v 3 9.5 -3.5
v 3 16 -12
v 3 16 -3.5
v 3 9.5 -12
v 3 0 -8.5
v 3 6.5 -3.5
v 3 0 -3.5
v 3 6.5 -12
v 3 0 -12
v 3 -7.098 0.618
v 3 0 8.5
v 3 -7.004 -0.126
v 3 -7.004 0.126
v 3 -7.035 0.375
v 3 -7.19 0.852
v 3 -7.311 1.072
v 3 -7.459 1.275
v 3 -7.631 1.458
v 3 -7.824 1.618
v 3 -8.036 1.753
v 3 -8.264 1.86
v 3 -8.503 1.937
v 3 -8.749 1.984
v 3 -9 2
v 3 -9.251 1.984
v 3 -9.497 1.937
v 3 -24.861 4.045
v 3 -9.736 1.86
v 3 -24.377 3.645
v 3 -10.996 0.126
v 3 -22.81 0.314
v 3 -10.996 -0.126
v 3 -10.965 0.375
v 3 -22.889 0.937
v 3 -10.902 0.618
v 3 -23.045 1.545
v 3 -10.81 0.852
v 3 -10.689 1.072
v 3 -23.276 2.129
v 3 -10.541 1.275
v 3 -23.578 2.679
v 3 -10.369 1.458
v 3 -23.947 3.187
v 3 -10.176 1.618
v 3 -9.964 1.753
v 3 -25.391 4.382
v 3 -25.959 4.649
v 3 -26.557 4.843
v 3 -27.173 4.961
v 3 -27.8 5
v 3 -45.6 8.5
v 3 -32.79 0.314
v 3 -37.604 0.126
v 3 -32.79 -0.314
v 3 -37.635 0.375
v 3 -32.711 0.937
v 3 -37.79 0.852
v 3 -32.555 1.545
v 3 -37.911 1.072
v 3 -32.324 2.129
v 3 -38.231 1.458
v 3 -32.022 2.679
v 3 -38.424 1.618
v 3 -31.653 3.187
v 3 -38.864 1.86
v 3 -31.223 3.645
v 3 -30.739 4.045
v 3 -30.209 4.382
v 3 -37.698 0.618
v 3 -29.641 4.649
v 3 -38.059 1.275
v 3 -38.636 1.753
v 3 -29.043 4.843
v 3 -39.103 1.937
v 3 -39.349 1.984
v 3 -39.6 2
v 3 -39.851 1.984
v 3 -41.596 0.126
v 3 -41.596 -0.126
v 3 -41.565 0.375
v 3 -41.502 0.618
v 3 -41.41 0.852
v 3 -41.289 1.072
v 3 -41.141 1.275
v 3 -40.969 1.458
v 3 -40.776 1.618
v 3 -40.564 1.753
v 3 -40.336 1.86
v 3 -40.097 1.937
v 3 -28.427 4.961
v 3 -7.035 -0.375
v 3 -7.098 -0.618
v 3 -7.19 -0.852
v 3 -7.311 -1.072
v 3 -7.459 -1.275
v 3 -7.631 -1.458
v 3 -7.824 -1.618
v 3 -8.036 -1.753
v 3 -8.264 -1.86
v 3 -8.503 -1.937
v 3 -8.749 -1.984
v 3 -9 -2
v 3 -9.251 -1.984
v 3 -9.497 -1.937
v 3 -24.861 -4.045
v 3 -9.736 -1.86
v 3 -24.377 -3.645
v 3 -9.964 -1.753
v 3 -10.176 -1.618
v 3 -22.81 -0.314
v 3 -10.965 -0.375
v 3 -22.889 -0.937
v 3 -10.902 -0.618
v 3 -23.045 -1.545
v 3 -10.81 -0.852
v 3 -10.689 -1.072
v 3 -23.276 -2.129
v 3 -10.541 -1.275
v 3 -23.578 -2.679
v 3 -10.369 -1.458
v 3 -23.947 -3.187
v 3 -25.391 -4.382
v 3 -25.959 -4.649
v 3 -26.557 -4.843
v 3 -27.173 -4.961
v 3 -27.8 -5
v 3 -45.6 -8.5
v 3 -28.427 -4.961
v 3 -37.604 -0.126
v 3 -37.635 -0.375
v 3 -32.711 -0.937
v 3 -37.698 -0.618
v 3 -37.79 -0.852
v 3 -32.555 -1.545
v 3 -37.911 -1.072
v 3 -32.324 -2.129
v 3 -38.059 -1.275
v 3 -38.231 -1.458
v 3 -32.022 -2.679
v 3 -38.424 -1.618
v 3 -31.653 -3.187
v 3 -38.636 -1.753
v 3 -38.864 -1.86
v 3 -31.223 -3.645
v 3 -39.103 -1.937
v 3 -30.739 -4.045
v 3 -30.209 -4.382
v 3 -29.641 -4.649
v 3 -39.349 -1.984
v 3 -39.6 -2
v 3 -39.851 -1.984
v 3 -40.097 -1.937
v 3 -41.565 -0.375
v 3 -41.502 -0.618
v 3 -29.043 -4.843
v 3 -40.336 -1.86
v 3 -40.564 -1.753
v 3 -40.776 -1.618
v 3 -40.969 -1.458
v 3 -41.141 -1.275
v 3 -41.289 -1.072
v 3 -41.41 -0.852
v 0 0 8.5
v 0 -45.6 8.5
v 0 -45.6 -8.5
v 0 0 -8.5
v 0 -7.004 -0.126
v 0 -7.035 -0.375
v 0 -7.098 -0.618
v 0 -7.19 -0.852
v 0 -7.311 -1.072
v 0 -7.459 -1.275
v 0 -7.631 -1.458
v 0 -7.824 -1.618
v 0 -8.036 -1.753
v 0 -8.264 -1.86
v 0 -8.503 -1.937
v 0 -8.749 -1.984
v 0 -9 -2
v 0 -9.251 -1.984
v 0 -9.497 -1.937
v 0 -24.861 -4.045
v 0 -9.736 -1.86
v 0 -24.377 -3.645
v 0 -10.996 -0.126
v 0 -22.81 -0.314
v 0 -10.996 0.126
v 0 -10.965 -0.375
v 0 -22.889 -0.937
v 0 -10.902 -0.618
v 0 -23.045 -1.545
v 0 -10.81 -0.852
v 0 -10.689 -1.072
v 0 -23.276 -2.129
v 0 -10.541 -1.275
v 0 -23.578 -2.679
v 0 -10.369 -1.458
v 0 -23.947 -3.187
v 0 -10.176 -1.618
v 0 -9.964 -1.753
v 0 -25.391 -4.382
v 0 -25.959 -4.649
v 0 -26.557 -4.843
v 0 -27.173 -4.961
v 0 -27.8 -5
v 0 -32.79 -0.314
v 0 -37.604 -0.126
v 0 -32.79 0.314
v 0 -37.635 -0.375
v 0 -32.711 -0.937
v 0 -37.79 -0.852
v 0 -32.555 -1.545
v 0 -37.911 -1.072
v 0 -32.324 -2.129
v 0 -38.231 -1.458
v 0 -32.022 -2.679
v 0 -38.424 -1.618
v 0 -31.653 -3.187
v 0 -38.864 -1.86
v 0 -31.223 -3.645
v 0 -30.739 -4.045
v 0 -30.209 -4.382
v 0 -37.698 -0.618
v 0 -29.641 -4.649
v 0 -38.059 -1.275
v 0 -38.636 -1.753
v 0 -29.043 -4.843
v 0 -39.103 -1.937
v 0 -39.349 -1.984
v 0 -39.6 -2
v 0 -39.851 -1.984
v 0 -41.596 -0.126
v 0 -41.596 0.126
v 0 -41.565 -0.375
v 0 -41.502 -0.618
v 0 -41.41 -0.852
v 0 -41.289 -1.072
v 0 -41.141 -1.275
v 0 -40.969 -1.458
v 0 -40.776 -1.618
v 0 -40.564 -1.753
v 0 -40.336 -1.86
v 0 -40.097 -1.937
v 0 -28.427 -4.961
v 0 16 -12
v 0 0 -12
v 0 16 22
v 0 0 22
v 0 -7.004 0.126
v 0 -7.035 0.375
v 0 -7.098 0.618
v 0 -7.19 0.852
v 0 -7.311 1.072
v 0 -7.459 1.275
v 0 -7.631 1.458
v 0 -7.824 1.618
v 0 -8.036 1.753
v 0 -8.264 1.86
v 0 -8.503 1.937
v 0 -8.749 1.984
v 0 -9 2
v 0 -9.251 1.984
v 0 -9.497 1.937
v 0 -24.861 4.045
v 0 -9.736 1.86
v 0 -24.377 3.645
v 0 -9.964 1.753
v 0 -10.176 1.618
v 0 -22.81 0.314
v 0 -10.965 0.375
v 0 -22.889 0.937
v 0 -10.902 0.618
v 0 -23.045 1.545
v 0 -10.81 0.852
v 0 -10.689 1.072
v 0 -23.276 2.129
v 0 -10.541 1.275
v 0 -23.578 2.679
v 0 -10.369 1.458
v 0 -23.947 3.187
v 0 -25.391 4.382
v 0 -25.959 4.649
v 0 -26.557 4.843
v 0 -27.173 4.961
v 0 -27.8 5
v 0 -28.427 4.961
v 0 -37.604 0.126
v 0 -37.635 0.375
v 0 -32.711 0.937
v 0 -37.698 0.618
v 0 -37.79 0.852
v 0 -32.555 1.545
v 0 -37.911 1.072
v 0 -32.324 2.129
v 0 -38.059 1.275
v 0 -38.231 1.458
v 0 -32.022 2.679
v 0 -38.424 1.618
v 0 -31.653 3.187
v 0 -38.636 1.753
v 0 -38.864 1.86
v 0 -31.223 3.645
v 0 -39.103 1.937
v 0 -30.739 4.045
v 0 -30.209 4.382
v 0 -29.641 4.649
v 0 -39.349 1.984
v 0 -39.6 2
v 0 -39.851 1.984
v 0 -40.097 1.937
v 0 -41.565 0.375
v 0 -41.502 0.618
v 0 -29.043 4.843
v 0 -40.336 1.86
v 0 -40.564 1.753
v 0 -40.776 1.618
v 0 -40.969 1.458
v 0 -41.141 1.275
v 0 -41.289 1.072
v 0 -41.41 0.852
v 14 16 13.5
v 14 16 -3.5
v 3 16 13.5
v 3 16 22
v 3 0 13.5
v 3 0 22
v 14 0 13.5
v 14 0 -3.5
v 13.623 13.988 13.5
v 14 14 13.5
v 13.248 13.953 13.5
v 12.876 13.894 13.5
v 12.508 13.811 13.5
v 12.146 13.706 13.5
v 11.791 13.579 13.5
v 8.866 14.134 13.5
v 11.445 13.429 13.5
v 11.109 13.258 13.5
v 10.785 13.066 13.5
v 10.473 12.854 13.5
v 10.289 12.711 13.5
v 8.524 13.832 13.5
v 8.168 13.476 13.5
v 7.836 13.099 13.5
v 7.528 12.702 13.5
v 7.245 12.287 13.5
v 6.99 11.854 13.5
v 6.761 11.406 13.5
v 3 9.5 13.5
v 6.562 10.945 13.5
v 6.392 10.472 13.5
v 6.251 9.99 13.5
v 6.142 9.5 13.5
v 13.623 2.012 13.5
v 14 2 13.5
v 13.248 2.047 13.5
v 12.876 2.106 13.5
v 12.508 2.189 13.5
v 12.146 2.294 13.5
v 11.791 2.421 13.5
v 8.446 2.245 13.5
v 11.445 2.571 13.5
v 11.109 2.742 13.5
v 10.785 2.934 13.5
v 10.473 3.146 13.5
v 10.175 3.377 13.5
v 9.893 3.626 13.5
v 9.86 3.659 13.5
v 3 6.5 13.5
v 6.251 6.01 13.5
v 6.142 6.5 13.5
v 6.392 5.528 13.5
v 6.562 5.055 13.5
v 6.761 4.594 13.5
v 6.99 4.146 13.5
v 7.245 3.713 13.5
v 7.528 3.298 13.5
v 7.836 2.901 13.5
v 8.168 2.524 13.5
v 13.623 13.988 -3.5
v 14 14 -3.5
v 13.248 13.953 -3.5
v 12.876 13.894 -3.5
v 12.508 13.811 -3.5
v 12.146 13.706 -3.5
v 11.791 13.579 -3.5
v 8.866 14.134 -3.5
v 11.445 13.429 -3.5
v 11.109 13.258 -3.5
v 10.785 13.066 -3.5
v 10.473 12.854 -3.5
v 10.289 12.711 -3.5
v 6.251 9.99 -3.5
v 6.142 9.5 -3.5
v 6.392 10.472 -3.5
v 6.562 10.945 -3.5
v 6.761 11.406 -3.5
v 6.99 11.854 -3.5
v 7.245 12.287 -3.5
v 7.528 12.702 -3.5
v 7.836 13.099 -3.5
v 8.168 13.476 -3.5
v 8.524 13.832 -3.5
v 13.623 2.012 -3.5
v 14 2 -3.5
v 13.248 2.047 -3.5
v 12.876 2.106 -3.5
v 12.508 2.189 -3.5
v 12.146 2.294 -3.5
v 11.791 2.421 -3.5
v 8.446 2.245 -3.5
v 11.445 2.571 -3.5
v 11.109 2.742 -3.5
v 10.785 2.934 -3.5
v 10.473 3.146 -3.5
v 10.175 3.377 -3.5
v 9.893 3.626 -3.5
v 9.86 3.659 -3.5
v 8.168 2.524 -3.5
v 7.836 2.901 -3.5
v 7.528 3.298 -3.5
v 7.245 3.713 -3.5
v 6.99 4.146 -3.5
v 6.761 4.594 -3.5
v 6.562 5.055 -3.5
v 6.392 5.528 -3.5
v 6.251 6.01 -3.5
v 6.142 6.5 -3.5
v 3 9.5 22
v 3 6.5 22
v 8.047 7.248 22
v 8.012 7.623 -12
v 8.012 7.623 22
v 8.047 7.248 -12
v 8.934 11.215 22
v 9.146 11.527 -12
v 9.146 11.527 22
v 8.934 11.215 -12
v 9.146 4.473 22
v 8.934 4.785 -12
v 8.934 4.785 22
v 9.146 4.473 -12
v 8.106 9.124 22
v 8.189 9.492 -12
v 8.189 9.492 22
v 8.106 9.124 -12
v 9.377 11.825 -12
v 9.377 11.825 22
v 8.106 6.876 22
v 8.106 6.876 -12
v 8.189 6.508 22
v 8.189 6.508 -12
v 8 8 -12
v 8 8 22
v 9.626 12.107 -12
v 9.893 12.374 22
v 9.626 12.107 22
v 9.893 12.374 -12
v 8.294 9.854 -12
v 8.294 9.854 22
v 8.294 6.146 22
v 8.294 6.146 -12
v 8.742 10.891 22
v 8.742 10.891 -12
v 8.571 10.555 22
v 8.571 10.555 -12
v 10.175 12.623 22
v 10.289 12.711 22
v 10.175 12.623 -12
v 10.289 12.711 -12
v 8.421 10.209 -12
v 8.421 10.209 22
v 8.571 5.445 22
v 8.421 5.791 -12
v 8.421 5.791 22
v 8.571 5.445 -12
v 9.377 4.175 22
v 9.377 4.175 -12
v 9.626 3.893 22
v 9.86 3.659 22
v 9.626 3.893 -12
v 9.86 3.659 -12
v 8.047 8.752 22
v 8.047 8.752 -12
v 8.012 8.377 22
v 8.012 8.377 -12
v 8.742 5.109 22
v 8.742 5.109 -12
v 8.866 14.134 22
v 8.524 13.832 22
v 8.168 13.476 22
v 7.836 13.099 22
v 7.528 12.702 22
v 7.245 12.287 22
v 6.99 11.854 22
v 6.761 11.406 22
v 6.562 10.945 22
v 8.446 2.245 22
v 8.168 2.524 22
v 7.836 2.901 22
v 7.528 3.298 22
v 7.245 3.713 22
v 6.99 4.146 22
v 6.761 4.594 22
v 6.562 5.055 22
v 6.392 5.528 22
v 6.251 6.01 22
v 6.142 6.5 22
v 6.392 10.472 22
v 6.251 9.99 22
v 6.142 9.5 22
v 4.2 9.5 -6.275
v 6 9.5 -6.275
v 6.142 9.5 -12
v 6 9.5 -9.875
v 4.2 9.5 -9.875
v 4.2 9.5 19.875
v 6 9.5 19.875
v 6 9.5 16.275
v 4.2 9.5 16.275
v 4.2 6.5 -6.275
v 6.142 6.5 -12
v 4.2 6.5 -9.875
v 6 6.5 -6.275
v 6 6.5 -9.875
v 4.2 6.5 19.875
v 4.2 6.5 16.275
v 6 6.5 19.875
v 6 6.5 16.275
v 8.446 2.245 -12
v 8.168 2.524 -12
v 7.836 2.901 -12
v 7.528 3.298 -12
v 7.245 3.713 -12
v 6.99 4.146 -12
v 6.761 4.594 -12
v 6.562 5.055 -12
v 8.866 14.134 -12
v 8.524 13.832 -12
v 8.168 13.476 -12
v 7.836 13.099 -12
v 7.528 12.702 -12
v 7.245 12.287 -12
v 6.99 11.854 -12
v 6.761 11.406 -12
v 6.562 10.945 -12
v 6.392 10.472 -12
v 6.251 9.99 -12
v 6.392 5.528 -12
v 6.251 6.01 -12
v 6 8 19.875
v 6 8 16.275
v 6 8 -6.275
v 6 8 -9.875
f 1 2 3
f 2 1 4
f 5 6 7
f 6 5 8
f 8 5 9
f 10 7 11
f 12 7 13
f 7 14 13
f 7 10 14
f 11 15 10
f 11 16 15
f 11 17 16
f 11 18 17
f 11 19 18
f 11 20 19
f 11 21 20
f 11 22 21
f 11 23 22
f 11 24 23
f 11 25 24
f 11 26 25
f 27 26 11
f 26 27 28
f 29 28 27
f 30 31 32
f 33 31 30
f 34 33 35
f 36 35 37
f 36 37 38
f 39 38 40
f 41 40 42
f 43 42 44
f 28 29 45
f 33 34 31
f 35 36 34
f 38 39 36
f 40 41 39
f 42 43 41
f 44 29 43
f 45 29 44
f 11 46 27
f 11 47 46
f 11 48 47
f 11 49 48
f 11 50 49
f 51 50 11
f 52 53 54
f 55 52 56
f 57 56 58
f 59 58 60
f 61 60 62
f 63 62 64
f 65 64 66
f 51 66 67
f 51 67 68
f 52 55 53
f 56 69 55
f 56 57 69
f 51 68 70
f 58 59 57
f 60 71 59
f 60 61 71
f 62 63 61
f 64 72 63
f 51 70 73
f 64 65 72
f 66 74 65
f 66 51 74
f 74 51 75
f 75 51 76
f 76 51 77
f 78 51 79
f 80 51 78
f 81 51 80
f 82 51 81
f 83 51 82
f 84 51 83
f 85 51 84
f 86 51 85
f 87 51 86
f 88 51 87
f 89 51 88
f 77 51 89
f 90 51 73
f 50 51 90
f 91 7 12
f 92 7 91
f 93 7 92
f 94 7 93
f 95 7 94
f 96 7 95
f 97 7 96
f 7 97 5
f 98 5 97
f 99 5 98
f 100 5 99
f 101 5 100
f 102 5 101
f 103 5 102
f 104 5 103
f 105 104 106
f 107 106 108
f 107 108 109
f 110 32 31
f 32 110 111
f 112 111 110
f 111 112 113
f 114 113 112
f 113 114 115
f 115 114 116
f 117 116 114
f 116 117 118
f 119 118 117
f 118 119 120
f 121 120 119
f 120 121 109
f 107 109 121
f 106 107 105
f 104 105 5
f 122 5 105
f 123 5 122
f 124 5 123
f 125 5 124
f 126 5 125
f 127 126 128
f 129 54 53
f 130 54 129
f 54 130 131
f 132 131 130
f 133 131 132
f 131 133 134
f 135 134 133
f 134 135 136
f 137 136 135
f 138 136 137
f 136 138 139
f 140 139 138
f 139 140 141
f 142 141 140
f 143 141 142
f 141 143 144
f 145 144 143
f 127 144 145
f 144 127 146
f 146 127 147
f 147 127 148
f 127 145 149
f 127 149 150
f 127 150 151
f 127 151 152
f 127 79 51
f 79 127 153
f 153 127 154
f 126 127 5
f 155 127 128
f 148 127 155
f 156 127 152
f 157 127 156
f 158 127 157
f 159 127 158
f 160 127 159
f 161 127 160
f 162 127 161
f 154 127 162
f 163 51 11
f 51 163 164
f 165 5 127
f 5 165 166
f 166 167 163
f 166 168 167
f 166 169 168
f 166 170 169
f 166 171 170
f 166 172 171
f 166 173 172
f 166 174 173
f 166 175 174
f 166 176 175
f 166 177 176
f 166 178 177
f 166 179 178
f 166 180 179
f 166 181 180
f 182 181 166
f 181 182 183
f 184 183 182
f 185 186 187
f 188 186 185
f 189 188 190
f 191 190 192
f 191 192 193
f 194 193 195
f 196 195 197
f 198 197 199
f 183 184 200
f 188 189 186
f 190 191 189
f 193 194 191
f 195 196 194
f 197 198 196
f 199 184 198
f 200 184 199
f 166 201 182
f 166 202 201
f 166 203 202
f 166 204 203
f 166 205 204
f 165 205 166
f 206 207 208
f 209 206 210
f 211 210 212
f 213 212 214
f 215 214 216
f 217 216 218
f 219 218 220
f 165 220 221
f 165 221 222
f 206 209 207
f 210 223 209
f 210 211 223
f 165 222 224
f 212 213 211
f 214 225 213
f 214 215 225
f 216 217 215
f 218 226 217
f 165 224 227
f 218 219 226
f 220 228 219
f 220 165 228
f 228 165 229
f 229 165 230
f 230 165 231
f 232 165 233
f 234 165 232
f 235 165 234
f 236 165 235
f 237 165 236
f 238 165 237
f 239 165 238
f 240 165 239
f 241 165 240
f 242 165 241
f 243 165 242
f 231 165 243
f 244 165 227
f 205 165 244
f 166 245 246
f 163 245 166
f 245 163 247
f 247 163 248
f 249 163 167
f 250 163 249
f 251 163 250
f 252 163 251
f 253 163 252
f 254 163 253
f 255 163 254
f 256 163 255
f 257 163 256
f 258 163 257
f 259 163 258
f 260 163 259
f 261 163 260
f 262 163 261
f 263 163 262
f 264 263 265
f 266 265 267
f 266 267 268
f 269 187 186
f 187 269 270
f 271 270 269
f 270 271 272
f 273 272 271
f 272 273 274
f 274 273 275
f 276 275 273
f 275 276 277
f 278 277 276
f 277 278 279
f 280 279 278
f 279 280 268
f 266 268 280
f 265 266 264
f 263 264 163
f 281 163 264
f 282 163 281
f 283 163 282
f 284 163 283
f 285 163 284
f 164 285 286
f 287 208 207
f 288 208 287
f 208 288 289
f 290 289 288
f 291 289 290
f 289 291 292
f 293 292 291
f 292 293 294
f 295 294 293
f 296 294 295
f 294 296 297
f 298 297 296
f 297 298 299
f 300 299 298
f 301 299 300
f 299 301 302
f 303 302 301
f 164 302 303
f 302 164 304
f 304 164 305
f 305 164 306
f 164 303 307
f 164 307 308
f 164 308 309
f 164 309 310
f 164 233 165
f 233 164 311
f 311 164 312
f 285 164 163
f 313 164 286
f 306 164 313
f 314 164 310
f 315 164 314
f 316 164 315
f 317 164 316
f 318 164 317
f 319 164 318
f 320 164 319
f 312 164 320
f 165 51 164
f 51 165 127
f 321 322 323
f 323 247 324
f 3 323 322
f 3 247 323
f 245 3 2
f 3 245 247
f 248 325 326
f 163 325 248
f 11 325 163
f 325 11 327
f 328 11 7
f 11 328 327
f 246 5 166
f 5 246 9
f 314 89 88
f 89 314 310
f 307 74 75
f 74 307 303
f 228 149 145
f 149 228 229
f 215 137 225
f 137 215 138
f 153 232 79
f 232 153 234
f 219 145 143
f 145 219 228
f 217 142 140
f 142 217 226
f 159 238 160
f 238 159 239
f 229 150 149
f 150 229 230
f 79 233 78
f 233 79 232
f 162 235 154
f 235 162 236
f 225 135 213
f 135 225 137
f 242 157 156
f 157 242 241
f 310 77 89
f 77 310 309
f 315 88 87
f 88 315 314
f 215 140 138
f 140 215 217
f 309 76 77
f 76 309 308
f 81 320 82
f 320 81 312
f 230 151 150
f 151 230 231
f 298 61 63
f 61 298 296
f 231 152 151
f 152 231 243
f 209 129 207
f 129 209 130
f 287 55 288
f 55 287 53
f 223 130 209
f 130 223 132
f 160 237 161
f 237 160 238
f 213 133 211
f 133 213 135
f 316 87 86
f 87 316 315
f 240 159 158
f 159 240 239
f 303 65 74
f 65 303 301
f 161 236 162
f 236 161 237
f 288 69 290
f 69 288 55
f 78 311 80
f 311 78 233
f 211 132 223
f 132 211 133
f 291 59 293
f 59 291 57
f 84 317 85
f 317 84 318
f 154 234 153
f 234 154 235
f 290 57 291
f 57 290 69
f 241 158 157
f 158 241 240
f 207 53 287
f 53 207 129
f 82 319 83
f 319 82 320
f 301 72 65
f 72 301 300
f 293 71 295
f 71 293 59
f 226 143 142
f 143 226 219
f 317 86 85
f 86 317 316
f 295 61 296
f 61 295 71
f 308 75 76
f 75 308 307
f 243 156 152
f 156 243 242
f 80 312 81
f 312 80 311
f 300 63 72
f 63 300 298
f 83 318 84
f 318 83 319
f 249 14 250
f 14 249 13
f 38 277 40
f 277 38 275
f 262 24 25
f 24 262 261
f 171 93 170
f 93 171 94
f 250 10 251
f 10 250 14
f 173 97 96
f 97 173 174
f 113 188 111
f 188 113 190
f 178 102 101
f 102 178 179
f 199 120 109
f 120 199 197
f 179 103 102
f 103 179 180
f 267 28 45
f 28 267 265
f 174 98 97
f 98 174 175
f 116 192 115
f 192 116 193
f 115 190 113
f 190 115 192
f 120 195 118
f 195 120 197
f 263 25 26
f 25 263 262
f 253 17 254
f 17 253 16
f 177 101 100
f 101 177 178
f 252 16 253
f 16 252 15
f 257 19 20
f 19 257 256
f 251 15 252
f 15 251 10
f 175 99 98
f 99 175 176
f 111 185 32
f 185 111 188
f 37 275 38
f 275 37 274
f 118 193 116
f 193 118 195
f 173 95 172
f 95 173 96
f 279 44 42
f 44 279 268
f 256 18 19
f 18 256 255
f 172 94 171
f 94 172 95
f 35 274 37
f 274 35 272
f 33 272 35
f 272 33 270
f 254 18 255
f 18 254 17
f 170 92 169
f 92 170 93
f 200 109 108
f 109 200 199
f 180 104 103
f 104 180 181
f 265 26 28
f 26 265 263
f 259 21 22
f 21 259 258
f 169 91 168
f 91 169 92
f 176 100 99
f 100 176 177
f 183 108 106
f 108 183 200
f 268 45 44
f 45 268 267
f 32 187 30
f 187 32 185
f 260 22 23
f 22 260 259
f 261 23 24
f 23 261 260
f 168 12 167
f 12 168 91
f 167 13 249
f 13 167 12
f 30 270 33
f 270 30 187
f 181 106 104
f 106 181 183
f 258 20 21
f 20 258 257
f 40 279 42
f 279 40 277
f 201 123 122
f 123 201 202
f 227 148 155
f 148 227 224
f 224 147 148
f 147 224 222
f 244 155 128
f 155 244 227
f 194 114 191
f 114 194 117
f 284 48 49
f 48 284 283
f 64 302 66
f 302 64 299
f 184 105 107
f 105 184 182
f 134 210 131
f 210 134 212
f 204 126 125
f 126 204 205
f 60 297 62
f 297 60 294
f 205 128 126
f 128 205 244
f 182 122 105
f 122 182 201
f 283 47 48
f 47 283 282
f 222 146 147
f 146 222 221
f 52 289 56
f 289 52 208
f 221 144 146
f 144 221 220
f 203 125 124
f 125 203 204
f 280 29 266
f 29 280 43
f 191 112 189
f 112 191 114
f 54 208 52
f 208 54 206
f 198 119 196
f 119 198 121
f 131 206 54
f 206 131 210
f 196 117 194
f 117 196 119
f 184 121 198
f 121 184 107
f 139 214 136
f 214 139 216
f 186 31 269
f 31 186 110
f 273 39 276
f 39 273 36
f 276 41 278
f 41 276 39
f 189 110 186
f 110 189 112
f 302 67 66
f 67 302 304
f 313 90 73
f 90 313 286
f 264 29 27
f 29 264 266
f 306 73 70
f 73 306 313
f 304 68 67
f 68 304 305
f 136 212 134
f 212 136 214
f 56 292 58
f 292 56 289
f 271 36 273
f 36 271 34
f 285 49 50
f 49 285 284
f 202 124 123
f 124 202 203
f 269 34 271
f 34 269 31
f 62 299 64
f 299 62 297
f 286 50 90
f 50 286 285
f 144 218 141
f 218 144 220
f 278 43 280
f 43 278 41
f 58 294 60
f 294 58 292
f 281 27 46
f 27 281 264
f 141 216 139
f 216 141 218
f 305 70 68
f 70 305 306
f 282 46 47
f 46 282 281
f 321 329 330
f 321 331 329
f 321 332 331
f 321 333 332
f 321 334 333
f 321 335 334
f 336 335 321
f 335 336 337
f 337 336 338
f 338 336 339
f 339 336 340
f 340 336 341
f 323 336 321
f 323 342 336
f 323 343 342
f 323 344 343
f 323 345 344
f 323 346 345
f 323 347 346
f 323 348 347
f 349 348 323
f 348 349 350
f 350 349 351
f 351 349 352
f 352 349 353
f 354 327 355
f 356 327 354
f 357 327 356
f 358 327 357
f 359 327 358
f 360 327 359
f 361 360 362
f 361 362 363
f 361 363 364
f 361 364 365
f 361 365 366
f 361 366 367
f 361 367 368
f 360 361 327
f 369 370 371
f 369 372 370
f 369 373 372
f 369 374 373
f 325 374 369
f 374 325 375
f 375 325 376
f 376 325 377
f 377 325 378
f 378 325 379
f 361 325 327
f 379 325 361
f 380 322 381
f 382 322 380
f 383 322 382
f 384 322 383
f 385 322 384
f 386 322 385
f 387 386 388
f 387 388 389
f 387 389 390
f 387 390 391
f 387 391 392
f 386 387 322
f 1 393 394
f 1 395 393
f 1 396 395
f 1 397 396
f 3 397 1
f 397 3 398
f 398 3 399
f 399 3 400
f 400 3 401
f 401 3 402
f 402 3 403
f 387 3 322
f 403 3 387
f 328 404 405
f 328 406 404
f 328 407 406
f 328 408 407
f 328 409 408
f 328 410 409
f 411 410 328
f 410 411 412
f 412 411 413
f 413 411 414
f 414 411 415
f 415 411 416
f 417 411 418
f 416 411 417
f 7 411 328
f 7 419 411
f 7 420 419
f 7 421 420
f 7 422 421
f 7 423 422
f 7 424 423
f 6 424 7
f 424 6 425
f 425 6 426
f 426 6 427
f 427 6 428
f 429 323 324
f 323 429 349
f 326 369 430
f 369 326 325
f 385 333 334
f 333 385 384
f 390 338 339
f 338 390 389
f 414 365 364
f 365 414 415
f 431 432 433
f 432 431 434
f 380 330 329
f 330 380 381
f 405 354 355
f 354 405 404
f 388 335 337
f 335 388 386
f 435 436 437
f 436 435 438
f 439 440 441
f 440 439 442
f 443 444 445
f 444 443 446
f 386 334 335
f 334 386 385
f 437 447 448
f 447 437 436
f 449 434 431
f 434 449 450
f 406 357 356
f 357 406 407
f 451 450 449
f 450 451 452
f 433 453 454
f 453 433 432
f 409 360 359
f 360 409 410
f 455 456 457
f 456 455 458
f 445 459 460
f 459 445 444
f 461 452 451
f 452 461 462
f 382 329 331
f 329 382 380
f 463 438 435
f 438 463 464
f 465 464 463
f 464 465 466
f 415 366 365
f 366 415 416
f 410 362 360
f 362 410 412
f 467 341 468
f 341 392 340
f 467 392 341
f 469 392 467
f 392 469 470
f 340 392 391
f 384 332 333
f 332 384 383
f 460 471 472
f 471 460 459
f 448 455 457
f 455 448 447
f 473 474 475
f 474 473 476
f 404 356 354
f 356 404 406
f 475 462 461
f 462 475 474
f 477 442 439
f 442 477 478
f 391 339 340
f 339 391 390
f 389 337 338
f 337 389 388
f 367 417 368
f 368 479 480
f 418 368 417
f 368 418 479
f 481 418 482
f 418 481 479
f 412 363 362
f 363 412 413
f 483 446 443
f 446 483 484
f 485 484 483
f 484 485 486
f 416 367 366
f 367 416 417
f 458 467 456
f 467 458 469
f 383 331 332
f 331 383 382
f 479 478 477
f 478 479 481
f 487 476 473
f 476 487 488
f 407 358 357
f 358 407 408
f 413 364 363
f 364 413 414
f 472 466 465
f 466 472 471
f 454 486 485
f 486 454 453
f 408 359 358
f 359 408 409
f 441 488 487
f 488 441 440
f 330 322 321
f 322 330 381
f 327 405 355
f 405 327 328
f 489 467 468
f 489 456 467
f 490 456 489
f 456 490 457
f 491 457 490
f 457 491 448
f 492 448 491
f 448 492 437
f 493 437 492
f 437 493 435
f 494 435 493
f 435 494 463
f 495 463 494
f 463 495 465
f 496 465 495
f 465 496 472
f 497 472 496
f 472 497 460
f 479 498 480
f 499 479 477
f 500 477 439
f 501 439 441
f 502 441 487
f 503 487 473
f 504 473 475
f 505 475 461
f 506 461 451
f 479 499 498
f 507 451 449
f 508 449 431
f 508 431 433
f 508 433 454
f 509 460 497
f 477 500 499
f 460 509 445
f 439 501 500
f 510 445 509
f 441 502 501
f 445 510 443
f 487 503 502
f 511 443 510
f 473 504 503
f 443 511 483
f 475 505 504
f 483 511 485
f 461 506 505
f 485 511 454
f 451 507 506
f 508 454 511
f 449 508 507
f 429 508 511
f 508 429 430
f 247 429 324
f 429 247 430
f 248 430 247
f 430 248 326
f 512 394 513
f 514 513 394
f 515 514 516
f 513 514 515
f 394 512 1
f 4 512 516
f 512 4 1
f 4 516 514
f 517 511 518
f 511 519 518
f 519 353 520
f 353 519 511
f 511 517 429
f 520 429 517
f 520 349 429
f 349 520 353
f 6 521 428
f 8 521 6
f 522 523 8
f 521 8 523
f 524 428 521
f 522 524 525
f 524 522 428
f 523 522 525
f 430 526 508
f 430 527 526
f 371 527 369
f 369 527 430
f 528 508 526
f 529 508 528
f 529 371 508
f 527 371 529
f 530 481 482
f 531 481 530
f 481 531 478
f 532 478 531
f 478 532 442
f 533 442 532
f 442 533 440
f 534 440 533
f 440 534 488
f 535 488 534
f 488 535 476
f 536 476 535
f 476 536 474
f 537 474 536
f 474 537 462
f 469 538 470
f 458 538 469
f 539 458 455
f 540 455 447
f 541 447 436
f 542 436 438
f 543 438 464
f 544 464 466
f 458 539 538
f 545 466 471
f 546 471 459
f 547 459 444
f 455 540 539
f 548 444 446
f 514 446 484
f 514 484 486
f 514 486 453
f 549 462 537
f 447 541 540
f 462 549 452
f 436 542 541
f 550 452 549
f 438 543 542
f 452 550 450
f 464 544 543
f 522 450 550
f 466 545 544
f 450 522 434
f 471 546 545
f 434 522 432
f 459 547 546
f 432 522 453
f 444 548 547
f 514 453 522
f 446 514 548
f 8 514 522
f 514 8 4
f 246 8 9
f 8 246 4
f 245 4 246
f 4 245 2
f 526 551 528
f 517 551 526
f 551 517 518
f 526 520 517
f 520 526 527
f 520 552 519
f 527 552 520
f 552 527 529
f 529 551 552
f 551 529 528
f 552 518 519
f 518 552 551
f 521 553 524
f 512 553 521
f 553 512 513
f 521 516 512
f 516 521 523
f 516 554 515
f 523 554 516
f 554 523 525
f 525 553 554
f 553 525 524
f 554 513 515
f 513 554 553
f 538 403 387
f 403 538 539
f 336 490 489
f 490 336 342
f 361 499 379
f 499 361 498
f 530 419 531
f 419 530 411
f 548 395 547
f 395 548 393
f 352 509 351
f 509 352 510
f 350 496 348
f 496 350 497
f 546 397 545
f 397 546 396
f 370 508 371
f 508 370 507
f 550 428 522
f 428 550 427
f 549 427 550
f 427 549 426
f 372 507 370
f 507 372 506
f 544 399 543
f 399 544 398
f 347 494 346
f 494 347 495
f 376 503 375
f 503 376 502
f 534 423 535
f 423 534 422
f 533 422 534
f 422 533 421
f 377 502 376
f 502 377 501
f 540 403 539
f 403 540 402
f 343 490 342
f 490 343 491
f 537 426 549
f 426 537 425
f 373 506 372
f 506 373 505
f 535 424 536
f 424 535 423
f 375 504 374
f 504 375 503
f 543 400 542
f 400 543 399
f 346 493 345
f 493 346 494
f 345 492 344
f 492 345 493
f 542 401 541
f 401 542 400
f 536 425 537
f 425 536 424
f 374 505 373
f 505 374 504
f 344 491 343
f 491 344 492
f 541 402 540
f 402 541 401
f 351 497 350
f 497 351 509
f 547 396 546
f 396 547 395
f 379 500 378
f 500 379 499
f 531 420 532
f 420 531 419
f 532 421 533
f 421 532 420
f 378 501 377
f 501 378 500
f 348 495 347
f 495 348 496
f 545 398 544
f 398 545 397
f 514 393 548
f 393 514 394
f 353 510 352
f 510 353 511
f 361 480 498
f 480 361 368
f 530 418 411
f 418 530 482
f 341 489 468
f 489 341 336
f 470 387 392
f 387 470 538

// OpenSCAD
// Extruder cable strain relief
// based on mount for proximity sensor of Ewald Beekman

// Height of the horizontal base
base_height = 17;
// Length of vertical plate before it connects to the holder cylinder. Negative value to position holder higher, Positive value position holder lower and 0 to make it level with the base.
vert_base_length = -5;
// Height of main cylinder that hold your cable. Same as the base height should be enough
holder_height = base_height;
// Thickness of the base plate. Adjust to your bolt length or just print a new bolt.
thickness = 3;  
// Thickness of the holder cylinder
thickness_c = 2;

// Screws for attachment to the extruder
// Distant between two screw
screws_spacing = 30.6;
// Diameter of the screw bolt, remember to add 0.2-0.3 to account for tolerance
screws_diameter = 4;

// Main cable holder
// Diameter of your cable bundle or wire wrap
cable_diameter = 12;
// Set ot the distance of the cable bundle to the last (rightmost) screwhole
holder_spacing = 6;
// Distant of cable holder from base plate, just to make sure there is enought room for the zip tie hole
holder_dist_base = 4;

// Sometime there is a scew in the middle we don't want to use. This hole is for side stepping that.
scew_hole = 10;
// Distance of the scew hole to the first (left) scew hole
scew_hole_dist = 11.8;

// Zip ties width. Standard zip ties width seem to be 2.5, 3.6 and 4.8
zip_width = 3.6;

$fn=50;

{
    base_start = thickness_c+holder_spacing+screws_spacing+screws_diameter+thickness;
    base_width = cable_diameter+2*thickness_c; // width of the vertical part to which the cylinder connects

    translate([0,-base_start,-base_height/2])
    union(){            // this is to combine base and holder
        // base
        difference(){
            union() {
                // horizontal base
                color("green")
                    cube([thickness, base_start+thickness+cable_diameter/2, base_height]);
                // vertical plate, to connect to the holder
                vert_base_length_tmp = vert_base_length >= 0 ? vert_base_length : 0;
                color("blue")
                    translate([0, base_start, -vert_base_length_tmp-holder_height+base_height])
                    cube([thickness, base_width, abs(vert_base_length)+holder_height]);
            }
            
            //Screw 1
            translate([-0.5, thickness_c+thickness_c/2+thickness, base_height/2])
                rotate([0,90,0])
                cylinder(d=screws_diameter, h=thickness + 1);
            //Screw 2
            translate([-0.5, thickness_c+thickness_c/2+thickness+screws_spacing, base_height/2])
                rotate([0,90,0])
                cylinder(d=screws_diameter, h=thickness + 1);
            // this is the hole of the screw I don't want to use
            color("blue")
                translate([-1, thickness_c + thickness_c/2 + thickness + scew_hole_dist, (base_height/2)])
                rotate([0,90,0])
                cylinder(d=scew_hole, h=thickness*2);
        }

        // holder
        translate([0, 0, -vert_base_length]) 
        union() {
            //Sensor cylinder
            $fn=100;
            difference() {
                union() {
                    translate([cable_diameter/2+2*thickness_c+holder_dist_base,base_start+thickness_c+cable_diameter/2, base_height-holder_height])
                        cylinder(d=cable_diameter+2*thickness_c, h=holder_height);

                    // this cube is for adhesion of the cylinder to the plate
                    color("red")
                        translate([thickness, base_start, base_height-holder_height])
                        cube([cable_diameter/2+2*thickness_c-thickness+holder_dist_base, cable_diameter+2*thickness_c, holder_height]);
                }
                

                // this is to form the hole for the sensor to go through
                translate([cable_diameter/2+2*thickness_c+holder_dist_base,base_start+thickness_c+cable_diameter/2, base_height-holder_height])
                    cylinder(d=cable_diameter, h=holder_height);
                
                // this is to cut the holder in half
                color("gray")
                    translate([cable_diameter/2 + 2*thickness_c + holder_dist_base, base_start, 0])
                    cube([cable_diameter + thickness_c, cable_diameter + thickness_c*2, holder_height]);
            } // diff
            
            // zip tie holder
            ext_height = (holder_height*1.5) / 2;
            color("orange")
                translate([0, base_start, base_height-ext_height*2])
                cube([thickness, cable_diameter+2*thickness_c, holder_height * 2]);
            difference() {
                zip_tie_base_width = cable_diameter/2+2*thickness_c-cable_diameter/2+holder_dist_base;
                color("purple")
                    translate([zip_tie_base_width, base_start + base_width/2 - thickness/2, base_height-ext_height*2])
                    rotate([0,0,90])
                    cube([thickness, zip_tie_base_width, holder_height * 2]);
                // holes for the zip ties
                // zip hole 1
                color("black")
                    translate([zip_tie_base_width - thickness_c,
                        base_start + base_width/2 - thickness/2,
                        base_height + ext_height/2 - zip_width])
                    rotate([0,0,90])
                    cube([thickness, zip_width/2, zip_width]);
                // zip hole 2
                color("black")
                    translate([zip_tie_base_width - thickness_c,
                        base_start + base_width/2 - thickness/2,
                        0 - ext_height/2])
                    rotate([0,0,90])
                    cube([thickness, zip_width/2, zip_width]);
            }
            difference() {
                // outer shell
                color("white")
                    translate([cable_diameter/2+2*thickness_c+holder_dist_base,
                        base_start+thickness_c+cable_diameter/2,
                        base_height-holder_height*1.5])
                    cylinder(d=cable_diameter+2*thickness_c, h=holder_height * 2);
                // inner cut out
                color("green")
                    translate([cable_diameter/2+2*thickness_c+holder_dist_base,
                        base_start+thickness_c+cable_diameter/2,
                        base_height-holder_height*1.5])
                    cylinder(d=cable_diameter, h=holder_height*2);
                // this is to cut the holder in half
                color("pink")
                    translate([cable_diameter/2 + 2*thickness_c + holder_dist_base,
                        base_start,
                        -holder_height/2])
                    cube([cable_diameter + thickness_c, cable_diameter + thickness_c*2, holder_height*2]);
                color("pink")
                    translate([cable_diameter/2 + 2*thickness_c + holder_dist_base,
                        base_start-cable_diameter,
                        -holder_height/2])
                    rotate([0,0,45])
                    cube([cable_diameter + thickness_c, cable_diameter + thickness_c, holder_height*2]);
                color("pink")
                    translate([cable_diameter/2 + 2*thickness_c + holder_dist_base,
                        base_start+cable_diameter-thickness,
                        -holder_height/2])
                    rotate([0,0,45])
                    cube([cable_diameter + thickness_c, cable_diameter + thickness_c, holder_height*2]);
            }
        }
    } // union
}
